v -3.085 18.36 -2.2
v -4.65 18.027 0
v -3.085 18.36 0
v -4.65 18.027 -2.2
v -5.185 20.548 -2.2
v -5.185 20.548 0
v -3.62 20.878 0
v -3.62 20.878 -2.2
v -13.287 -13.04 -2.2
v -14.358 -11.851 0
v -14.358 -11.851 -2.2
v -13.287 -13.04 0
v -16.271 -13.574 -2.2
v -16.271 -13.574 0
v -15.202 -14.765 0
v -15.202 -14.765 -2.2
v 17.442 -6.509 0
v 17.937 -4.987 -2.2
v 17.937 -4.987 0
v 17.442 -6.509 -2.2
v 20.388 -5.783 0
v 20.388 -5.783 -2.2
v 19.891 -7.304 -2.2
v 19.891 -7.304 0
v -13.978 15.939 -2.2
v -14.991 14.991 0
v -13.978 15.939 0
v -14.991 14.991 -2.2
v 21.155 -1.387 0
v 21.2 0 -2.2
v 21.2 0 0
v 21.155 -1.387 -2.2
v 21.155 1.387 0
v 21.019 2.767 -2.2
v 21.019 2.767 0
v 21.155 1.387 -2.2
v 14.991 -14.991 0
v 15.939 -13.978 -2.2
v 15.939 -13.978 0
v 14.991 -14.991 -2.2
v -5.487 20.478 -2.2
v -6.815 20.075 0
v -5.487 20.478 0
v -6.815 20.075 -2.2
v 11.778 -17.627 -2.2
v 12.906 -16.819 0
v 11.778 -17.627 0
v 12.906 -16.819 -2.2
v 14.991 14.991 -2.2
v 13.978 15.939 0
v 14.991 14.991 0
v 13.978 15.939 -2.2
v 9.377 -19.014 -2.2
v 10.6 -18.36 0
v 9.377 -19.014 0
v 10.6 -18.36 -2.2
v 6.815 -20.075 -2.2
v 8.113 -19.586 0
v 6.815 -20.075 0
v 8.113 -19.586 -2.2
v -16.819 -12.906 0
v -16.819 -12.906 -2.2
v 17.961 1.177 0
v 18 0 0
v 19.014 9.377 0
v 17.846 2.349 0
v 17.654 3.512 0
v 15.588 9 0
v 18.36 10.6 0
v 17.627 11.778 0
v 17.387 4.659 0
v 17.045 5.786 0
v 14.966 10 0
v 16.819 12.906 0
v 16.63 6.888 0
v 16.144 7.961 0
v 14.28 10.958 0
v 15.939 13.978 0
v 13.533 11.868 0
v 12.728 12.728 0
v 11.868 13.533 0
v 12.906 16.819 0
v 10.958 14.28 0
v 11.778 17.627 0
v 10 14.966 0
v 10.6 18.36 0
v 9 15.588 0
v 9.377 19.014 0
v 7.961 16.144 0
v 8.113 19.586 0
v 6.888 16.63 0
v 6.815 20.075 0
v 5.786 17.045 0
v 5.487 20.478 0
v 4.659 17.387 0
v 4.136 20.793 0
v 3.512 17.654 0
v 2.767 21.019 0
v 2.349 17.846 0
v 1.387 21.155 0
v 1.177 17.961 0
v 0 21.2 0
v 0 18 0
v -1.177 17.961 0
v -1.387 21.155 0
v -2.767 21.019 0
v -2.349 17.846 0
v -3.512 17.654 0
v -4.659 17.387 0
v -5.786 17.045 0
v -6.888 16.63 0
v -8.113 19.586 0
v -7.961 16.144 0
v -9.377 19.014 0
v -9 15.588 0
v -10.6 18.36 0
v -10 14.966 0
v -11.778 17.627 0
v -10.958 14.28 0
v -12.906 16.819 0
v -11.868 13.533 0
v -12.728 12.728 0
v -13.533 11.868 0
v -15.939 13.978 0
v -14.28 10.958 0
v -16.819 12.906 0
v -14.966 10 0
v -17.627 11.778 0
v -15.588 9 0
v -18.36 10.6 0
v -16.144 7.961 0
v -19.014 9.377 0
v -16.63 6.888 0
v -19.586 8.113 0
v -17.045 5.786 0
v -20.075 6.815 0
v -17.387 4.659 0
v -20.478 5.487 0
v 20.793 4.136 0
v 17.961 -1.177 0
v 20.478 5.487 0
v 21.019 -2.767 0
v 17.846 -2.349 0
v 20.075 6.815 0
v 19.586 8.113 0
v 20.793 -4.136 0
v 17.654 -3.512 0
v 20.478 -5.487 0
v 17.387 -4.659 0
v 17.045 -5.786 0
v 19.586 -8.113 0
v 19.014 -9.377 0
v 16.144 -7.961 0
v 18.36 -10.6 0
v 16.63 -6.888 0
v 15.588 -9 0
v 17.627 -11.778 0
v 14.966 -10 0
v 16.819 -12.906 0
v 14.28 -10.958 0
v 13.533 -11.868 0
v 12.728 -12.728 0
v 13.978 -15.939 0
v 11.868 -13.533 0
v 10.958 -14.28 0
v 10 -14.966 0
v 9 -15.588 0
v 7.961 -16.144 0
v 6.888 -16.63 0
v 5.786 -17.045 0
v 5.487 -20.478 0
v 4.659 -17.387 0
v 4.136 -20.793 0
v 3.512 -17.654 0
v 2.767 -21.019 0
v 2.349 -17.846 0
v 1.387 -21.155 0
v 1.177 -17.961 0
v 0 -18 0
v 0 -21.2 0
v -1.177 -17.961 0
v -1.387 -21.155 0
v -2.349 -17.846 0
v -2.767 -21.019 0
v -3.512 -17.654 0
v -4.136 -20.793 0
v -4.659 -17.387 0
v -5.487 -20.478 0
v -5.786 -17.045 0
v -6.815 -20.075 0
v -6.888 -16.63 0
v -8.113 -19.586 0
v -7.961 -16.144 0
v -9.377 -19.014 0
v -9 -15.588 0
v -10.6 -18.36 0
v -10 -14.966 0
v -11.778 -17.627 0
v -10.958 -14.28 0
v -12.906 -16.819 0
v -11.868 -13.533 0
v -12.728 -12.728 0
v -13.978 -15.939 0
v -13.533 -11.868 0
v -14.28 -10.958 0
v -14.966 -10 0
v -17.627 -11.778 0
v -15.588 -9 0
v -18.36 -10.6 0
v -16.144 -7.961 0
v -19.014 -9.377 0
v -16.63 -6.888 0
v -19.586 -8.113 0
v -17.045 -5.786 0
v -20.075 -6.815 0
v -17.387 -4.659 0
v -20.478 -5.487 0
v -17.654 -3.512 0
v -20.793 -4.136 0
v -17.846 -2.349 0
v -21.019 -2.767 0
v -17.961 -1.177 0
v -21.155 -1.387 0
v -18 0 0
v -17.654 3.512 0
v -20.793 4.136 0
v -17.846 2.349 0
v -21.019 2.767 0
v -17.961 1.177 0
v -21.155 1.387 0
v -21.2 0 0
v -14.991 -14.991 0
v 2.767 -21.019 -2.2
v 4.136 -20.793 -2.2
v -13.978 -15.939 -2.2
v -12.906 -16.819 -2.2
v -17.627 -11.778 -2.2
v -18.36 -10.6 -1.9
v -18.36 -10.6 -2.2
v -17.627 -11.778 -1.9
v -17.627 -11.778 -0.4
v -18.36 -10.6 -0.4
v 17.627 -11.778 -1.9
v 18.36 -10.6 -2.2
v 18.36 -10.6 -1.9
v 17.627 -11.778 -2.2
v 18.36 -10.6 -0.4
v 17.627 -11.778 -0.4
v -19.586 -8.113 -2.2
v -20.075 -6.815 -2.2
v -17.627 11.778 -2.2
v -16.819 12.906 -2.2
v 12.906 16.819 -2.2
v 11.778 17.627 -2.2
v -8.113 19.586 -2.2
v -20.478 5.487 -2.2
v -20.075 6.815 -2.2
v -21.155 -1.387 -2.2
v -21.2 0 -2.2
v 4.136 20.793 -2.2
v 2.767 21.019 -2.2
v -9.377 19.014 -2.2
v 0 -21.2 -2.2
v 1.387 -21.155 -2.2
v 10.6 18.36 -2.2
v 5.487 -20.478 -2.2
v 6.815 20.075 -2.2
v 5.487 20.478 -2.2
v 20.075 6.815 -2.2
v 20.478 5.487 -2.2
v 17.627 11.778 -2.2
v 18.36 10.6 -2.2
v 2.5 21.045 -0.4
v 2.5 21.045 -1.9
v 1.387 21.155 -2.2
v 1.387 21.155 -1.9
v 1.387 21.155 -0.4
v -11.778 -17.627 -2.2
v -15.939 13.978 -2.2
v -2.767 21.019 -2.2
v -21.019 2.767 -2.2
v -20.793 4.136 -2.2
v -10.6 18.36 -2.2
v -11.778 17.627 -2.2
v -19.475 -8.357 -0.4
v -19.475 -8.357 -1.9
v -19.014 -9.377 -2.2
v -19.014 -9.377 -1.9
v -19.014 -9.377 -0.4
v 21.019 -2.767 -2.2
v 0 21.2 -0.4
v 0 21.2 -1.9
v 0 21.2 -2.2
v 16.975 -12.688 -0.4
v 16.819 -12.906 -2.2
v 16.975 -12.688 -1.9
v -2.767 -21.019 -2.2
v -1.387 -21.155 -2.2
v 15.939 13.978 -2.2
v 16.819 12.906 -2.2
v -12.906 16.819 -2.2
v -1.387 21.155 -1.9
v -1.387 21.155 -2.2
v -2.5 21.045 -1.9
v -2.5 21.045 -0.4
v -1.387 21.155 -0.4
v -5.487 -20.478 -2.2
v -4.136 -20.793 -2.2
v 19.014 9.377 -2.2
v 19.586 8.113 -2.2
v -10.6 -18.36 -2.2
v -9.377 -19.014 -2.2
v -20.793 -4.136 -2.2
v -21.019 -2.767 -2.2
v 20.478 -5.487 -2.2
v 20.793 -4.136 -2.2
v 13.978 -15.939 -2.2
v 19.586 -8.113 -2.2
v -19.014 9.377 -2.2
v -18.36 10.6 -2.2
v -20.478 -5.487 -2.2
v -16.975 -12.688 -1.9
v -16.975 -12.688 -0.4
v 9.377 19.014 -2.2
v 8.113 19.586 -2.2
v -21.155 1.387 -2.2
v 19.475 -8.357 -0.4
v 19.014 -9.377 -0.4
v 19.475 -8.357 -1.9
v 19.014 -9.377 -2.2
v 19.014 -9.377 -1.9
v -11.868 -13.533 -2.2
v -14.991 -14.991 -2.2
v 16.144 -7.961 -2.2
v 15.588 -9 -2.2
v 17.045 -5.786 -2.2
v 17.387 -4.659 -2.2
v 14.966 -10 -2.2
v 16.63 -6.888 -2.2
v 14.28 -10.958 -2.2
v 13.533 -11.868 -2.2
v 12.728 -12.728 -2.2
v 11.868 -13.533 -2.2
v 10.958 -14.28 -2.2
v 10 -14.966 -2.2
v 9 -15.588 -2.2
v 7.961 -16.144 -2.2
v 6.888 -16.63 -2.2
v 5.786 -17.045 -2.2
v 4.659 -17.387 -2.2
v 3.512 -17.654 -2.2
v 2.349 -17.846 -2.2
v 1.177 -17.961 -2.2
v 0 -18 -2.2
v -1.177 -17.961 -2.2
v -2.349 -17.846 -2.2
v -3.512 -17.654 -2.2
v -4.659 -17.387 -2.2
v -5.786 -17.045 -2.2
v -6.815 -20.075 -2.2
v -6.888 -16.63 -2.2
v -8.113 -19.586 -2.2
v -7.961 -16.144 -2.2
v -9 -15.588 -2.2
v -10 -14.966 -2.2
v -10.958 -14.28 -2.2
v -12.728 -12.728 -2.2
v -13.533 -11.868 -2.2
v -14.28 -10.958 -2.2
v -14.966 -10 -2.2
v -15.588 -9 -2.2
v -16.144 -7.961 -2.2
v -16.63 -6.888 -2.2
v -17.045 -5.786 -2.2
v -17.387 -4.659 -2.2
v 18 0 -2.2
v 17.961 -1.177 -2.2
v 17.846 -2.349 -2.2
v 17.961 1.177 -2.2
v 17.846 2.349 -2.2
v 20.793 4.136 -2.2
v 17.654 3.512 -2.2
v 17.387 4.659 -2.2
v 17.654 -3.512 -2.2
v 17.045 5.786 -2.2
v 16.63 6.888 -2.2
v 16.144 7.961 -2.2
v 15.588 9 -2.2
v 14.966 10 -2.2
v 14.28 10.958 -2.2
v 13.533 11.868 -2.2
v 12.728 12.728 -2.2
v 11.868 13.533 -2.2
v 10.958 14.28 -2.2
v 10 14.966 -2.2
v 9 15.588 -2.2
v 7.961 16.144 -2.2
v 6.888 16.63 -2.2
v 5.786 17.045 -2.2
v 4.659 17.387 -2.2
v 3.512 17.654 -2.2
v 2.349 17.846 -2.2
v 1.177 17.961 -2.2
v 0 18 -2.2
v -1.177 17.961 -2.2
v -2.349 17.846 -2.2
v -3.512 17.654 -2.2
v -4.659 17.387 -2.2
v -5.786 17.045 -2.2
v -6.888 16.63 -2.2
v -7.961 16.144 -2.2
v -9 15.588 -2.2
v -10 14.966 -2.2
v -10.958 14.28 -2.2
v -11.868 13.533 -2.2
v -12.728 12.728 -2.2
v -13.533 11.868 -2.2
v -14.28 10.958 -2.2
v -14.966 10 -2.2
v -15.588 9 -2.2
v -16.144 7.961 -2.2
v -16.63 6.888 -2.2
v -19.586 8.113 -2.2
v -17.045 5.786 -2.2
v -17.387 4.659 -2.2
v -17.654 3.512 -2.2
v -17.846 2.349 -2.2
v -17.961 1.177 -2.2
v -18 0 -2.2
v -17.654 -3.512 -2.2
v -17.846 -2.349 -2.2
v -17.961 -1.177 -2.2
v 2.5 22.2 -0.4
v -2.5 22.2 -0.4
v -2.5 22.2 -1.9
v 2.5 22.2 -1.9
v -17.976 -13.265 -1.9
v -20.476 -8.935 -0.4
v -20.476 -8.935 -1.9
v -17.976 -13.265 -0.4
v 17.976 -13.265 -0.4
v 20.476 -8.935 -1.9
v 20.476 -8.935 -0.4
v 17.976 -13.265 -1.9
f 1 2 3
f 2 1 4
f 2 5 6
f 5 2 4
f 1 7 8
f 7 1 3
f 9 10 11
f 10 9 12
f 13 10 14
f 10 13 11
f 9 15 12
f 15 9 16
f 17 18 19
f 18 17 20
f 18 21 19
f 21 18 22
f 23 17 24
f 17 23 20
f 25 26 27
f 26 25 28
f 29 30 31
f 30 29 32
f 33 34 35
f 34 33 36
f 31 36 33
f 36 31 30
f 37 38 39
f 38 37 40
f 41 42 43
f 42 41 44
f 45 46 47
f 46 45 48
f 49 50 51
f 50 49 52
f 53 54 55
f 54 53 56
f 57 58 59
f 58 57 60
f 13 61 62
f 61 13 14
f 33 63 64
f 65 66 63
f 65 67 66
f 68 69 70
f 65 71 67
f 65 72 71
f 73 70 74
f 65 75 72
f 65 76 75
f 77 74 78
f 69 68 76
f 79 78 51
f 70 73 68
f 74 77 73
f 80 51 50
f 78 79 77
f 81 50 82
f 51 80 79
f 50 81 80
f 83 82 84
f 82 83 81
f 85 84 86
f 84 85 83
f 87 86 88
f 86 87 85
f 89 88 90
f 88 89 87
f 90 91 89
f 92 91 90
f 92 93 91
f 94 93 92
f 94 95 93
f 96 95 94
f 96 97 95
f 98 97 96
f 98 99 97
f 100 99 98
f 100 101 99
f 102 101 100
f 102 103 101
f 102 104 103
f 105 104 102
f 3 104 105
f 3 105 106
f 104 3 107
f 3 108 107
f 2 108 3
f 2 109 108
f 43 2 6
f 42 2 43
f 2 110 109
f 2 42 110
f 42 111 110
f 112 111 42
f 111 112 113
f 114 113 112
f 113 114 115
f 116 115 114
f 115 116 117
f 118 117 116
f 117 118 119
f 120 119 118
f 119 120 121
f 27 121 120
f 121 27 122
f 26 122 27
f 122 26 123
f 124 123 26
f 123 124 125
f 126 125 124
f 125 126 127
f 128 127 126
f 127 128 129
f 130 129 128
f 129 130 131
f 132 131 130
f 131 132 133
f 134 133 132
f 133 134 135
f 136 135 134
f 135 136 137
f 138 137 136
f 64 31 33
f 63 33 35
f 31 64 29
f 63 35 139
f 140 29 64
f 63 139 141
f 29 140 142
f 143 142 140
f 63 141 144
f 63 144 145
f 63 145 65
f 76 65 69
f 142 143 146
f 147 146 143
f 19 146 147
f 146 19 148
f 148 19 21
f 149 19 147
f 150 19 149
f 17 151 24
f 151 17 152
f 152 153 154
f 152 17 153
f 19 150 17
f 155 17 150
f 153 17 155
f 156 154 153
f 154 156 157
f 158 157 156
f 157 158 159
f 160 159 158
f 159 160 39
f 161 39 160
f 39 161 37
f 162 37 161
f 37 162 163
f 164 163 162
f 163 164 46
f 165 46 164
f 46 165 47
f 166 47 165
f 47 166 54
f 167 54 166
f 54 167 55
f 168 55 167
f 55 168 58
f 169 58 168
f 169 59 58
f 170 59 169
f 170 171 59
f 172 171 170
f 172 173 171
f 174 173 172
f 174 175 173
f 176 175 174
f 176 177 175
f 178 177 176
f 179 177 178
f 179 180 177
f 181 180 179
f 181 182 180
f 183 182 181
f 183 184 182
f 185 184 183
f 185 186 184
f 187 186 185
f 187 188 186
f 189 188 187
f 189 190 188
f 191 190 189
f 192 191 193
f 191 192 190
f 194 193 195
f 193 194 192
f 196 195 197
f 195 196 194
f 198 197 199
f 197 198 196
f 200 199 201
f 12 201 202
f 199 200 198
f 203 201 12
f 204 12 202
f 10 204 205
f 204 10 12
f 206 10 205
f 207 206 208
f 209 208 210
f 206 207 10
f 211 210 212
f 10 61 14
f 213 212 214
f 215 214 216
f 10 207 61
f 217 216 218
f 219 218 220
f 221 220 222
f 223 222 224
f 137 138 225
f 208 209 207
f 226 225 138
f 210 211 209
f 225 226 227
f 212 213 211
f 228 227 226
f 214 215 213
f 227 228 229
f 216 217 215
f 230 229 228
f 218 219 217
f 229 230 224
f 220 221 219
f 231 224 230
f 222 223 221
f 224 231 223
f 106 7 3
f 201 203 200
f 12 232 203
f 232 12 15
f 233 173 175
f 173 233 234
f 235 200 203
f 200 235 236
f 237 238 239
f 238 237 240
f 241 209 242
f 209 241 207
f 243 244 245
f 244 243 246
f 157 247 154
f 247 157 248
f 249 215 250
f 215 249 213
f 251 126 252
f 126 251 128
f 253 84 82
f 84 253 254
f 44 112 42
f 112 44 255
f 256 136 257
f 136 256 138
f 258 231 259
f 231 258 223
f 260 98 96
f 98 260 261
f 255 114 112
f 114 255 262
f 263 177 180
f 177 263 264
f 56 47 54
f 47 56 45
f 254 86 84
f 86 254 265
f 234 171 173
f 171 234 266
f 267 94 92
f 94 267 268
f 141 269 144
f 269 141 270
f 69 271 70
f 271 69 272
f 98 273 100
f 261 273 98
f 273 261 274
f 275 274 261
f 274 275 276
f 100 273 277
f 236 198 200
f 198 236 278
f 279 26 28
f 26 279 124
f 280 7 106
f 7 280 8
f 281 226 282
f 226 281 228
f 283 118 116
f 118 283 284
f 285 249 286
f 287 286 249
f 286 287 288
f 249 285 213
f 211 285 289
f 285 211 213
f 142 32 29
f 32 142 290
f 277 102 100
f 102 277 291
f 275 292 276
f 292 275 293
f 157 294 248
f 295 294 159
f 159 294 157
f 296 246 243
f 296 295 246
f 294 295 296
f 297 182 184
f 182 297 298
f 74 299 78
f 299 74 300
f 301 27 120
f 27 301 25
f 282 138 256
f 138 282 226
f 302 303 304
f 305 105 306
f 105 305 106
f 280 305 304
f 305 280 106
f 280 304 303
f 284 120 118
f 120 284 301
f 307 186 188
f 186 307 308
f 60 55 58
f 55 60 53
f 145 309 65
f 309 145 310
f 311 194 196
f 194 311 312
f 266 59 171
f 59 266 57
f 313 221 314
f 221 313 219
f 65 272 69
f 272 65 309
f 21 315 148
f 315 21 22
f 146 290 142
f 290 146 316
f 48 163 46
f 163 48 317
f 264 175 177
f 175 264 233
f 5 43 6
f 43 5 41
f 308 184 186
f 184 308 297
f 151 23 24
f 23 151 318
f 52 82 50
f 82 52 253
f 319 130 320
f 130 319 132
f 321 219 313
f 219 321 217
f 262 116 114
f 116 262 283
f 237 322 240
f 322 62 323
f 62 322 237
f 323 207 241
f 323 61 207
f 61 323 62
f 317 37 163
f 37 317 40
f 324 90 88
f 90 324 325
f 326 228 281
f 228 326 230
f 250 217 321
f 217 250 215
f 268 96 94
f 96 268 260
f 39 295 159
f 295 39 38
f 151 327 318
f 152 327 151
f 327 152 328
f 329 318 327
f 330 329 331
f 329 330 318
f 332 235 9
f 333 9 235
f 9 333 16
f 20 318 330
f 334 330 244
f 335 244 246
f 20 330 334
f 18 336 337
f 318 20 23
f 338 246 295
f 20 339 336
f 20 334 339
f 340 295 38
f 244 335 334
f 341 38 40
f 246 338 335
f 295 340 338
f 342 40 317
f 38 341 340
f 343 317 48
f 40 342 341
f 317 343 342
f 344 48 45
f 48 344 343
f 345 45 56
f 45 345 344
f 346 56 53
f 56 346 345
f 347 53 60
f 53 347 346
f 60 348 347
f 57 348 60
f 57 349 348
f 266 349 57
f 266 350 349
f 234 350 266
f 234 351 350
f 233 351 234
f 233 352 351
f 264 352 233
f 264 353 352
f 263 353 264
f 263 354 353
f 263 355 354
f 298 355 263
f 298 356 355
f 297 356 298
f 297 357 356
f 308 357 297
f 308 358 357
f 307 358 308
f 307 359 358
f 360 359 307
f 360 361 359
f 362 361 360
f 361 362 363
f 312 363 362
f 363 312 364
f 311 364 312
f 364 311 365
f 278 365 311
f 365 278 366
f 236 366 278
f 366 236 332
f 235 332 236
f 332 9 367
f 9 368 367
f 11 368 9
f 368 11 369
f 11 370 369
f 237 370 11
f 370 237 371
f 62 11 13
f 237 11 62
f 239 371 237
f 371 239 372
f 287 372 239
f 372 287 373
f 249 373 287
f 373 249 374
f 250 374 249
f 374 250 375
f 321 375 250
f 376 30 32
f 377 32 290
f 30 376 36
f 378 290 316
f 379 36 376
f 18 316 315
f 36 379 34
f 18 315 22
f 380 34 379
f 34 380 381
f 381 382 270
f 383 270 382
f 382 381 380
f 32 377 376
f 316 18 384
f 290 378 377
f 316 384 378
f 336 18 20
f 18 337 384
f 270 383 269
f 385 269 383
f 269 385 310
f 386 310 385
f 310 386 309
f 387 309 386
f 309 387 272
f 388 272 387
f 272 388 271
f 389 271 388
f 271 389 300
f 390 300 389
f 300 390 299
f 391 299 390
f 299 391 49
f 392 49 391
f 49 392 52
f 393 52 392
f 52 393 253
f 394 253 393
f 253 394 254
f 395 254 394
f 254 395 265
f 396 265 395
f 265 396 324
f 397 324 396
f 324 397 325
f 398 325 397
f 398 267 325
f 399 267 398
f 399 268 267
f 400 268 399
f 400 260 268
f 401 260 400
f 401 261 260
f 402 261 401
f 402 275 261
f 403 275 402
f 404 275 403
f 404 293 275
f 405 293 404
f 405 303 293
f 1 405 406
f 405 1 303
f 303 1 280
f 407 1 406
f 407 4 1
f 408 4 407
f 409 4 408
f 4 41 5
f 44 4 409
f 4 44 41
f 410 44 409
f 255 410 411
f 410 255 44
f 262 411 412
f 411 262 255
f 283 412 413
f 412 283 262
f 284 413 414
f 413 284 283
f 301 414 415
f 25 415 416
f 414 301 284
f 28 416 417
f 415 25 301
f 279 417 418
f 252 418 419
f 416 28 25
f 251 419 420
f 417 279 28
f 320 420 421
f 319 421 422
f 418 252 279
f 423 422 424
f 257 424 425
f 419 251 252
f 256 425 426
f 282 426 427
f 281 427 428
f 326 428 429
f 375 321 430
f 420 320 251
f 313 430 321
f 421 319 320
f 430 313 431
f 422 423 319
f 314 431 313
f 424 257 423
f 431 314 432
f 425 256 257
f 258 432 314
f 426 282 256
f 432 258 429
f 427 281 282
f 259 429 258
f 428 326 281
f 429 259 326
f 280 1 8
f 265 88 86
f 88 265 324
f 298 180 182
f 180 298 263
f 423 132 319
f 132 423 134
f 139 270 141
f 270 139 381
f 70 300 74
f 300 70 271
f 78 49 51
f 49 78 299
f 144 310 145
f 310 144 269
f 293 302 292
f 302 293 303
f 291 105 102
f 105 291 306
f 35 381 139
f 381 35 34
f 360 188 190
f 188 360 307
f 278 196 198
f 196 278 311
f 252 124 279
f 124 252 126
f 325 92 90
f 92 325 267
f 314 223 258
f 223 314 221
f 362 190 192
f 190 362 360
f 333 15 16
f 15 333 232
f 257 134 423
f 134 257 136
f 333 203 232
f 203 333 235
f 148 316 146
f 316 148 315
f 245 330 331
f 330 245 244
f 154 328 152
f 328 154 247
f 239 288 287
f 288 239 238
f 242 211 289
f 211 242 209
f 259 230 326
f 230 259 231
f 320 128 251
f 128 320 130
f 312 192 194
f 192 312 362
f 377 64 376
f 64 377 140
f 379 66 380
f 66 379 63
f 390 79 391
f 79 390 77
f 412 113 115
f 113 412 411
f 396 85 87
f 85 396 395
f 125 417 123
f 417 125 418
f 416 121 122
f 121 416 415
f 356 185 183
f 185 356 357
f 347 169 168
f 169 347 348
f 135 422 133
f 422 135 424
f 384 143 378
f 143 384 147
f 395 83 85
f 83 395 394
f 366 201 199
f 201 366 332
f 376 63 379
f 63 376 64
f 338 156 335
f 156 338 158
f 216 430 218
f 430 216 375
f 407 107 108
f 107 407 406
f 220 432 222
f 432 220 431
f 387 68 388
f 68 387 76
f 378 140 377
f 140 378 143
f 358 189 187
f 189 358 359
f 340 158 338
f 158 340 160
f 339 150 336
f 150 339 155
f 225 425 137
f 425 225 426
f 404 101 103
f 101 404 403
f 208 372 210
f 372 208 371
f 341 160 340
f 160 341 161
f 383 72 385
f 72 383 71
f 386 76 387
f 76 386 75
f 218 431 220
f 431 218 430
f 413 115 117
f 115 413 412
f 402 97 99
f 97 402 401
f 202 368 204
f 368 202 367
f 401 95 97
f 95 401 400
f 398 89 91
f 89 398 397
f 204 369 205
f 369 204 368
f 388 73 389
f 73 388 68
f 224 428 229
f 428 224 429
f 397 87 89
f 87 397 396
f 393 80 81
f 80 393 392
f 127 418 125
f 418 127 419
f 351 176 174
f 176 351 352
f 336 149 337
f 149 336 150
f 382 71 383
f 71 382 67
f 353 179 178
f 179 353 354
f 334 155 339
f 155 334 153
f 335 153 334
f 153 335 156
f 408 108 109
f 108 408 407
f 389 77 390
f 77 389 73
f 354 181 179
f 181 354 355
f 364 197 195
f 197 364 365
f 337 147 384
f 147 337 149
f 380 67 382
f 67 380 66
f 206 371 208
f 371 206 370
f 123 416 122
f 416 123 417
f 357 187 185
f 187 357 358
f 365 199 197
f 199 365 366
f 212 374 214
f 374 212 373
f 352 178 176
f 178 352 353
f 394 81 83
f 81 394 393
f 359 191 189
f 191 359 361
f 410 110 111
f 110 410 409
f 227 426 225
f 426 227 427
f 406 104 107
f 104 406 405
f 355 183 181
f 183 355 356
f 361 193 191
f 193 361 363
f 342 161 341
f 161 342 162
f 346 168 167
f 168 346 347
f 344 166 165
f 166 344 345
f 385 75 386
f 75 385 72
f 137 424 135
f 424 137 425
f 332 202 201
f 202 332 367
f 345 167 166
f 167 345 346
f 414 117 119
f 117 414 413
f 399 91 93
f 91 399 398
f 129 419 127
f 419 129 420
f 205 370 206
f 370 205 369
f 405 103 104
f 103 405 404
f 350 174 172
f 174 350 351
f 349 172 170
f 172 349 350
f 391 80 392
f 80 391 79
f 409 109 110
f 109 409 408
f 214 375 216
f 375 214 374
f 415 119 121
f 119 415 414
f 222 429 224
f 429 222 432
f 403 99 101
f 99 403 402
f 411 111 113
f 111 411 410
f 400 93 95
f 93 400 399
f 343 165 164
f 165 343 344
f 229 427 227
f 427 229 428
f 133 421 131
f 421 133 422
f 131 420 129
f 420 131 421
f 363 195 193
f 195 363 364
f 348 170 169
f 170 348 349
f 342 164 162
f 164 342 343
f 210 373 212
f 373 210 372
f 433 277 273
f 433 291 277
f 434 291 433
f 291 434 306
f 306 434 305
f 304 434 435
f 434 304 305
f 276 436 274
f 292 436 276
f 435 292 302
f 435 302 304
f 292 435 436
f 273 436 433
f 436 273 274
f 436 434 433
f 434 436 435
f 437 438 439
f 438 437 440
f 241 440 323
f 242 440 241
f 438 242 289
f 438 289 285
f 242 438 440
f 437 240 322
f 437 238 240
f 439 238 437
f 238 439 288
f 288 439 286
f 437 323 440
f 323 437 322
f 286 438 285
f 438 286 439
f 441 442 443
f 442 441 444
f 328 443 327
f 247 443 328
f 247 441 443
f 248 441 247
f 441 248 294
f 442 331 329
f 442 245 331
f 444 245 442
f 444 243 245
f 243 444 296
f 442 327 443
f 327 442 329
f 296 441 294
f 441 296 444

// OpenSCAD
// ============================================================================
// window_retainer_001.scad — Đĩa acrylic đáy + vòng ép SNAP-FIT
// ----------------------------------------------------------------------------
// - acrylic_window(): đĩa acrylic TRONG Ø42×3 (MUA/CẮT — không in; mock tham chiếu).
// - window_retainer(): vòng ép IN 3D, luồn từ dưới vào hốc Ø42.7 của khay,
//   3 TAI NGÀM (90/210/330° — tránh cổng ±X) cài vào 3 cửa sổ ở váy khay,
//   ép đĩa lên gờ kê 1mm + lớp silicon hồ cá (chống rò, KHÔNG keo 502 — fogging).
//   Vít M2.5 bất khả thi hình học với OD khay 44 → snap-fit (README cho phép).
// Gốc cục bộ: mặt TRÊN vòng ép = z=0 (mặt tiếp đĩa); assembly đặt theo z_tray_bot.
// ============================================================================
include <../constants.scad>

EPS = 0.05;

module acrylic_window() {
    color(col_acrylic) cylinder(d = tray_win_d, h = tray_win_t, $fn = 96);
}

module window_retainer() {
    ring_od = tray_win_d + 2*win_clr - 0.3;  // Ø42.4 trượt trong hốc Ø42.7
    ring_id = 36.0;                          // không che cửa sổ sáng quá sâu
    tab_w   = 5.0;
    color(col_plastic) {
        difference() {
            translate([0, 0, -retainer_t]) cylinder(d = ring_od, h = retainer_t, $fn = 96);
            translate([0, 0, -retainer_t - EPS]) cylinder(d = ring_id, h = retainer_t + 2*EPS, $fn = 96);
            // 3 khe đàn hồi cạnh tai (cho vòng bóp vào khi luồn)
            for (a = [90, 210, 330])
                rotate([0, 0, a + 12])
                    translate([ring_od/2 - 2.6, -0.8, -retainer_t - EPS])
                        cube([3, 1.6, retainer_t + 2*EPS]);
        }
        // 3 tai ngàm (bướu ngoài, khớp cửa sổ 6×1.8 ở váy khay)
        for (a = [90, 210, 330])
            rotate([0, 0, a])
                translate([ring_od/2 - 0.6, -tab_w/2, -retainer_t + 0.3])
                    cube([1.6, tab_w, 1.5]);
    }
}

// Xem lẻ: vòng ép + đĩa (ghost) đặt đúng tương quan
window_retainer();
%translate([0, 0, 0.3]) acrylic_window();  // 0.3 = lớp silicon
